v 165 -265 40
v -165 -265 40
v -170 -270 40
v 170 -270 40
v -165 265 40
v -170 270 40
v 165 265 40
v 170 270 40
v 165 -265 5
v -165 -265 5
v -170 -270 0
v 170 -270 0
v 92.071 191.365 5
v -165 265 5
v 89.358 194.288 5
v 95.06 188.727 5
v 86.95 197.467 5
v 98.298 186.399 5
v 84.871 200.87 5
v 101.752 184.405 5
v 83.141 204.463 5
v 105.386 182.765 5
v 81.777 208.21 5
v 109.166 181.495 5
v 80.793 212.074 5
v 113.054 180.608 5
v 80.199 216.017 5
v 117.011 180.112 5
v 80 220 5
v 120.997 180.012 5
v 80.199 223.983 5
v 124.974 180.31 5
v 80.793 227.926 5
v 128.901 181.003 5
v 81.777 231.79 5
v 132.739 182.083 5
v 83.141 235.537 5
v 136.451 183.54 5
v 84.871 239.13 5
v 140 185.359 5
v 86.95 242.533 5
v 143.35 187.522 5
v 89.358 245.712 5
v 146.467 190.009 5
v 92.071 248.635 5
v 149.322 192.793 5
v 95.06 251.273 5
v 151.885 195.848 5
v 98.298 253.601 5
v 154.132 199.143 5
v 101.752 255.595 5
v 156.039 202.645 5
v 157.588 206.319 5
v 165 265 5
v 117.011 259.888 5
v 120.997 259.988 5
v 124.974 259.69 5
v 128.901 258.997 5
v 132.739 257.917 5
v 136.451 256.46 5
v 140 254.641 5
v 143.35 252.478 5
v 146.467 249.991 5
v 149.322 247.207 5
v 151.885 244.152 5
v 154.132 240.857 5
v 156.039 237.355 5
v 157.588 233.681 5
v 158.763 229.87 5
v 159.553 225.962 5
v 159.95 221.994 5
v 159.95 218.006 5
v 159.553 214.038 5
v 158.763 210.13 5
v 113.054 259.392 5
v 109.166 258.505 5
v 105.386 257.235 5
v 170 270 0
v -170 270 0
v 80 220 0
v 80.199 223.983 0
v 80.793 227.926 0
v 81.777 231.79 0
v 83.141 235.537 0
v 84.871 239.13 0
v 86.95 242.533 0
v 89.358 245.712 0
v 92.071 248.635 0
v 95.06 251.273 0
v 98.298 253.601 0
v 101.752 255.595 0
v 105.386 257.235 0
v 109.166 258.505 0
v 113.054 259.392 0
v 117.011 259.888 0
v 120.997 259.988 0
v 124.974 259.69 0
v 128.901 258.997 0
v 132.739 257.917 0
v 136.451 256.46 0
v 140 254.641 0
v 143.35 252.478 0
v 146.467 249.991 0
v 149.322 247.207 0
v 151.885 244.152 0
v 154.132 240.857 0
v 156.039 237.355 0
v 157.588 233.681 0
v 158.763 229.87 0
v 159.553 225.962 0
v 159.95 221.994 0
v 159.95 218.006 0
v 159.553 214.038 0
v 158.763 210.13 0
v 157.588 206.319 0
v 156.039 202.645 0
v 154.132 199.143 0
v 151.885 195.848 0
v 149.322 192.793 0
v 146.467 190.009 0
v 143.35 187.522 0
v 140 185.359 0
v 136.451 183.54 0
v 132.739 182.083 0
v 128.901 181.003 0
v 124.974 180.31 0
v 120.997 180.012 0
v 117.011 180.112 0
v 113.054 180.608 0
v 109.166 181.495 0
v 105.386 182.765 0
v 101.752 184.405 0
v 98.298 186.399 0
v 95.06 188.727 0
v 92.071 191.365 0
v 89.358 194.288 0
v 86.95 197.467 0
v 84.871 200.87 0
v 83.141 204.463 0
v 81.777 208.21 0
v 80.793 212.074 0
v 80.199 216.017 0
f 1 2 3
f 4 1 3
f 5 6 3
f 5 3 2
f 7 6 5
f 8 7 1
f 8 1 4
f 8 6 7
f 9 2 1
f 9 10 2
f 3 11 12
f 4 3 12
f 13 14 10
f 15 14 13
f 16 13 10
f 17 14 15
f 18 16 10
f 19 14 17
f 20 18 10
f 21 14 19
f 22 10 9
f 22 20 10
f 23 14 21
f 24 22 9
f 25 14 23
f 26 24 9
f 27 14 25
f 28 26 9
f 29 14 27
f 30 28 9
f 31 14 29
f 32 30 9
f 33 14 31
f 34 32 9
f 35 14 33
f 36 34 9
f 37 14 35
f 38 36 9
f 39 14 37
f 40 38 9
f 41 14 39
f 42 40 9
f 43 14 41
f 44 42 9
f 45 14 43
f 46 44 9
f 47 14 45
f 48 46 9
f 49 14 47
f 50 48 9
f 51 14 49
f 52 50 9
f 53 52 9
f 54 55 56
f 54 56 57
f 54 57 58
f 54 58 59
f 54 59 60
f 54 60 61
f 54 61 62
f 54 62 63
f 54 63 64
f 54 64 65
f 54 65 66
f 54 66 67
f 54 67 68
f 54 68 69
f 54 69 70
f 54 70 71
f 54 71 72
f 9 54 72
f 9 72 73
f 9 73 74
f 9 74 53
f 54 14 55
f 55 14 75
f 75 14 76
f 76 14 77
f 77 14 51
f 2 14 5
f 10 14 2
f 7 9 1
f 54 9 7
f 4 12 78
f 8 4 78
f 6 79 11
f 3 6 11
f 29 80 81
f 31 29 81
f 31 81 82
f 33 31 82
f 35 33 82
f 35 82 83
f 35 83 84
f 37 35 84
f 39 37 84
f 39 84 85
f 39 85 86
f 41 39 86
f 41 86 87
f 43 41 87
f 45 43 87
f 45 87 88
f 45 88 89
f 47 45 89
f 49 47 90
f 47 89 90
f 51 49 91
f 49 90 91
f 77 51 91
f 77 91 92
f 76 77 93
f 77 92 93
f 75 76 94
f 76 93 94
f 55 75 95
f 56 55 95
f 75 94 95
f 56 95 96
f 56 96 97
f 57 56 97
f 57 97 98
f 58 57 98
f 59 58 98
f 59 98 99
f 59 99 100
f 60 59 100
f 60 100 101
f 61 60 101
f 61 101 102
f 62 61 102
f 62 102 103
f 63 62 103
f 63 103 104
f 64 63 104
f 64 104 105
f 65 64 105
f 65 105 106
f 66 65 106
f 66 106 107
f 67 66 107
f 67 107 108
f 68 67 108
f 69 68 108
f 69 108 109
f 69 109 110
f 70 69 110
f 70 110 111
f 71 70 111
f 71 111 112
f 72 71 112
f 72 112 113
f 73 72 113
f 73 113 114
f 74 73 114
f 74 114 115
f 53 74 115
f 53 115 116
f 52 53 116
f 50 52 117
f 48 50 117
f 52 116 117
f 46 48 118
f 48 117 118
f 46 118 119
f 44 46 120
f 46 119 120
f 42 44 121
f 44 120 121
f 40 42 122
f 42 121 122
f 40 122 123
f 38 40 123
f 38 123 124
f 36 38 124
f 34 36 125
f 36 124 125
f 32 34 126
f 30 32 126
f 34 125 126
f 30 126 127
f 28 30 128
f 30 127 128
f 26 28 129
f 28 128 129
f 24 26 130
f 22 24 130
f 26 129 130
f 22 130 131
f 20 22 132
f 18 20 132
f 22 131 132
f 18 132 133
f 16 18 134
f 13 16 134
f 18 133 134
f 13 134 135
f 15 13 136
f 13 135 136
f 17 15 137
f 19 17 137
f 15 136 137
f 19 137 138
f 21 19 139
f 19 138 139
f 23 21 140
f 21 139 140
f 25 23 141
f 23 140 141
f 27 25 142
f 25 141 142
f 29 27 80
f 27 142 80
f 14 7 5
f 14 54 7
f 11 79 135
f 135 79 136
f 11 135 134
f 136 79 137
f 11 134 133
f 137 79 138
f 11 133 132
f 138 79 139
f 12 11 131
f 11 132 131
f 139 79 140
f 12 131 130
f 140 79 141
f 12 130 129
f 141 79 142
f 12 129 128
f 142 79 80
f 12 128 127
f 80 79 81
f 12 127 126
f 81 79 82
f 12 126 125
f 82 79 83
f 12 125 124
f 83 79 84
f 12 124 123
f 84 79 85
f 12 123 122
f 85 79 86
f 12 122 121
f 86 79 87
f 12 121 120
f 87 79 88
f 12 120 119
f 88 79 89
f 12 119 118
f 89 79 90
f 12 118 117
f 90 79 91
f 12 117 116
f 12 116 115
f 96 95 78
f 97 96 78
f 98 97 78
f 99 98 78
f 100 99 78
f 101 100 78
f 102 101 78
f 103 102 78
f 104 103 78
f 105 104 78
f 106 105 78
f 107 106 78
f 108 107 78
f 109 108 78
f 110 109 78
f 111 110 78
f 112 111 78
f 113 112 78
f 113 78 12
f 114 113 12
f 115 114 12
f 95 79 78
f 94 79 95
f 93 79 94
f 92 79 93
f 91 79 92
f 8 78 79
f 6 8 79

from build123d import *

# Parameters (mm, degrees)
F1_DEPTH = 40
F2_T     = -5
F4_D     = 80
F4_DEPTH = 60


with BuildPart() as f1:
    # F0 (on Top) → F1 (new body)
    with BuildSketch(Plane.XY):
        Polygon((-170, 270), (-170, 0), (-170, -270), (170, -270), (170, 270), align=None)
    extrude(amount=F1_DEPTH)

    # F2
    f2_openings = [f1.faces().sort_by_distance(p)[0] for p in [
        (0, 0, 40),
    ]]
    offset(amount=F2_T, openings=f2_openings)

    # F4
    with Locations(Plane.XY.offset(5)):
        with Locations((120, 220)):
            Hole(F4_D / 2, depth=F4_DEPTH)


solid = f1.part
